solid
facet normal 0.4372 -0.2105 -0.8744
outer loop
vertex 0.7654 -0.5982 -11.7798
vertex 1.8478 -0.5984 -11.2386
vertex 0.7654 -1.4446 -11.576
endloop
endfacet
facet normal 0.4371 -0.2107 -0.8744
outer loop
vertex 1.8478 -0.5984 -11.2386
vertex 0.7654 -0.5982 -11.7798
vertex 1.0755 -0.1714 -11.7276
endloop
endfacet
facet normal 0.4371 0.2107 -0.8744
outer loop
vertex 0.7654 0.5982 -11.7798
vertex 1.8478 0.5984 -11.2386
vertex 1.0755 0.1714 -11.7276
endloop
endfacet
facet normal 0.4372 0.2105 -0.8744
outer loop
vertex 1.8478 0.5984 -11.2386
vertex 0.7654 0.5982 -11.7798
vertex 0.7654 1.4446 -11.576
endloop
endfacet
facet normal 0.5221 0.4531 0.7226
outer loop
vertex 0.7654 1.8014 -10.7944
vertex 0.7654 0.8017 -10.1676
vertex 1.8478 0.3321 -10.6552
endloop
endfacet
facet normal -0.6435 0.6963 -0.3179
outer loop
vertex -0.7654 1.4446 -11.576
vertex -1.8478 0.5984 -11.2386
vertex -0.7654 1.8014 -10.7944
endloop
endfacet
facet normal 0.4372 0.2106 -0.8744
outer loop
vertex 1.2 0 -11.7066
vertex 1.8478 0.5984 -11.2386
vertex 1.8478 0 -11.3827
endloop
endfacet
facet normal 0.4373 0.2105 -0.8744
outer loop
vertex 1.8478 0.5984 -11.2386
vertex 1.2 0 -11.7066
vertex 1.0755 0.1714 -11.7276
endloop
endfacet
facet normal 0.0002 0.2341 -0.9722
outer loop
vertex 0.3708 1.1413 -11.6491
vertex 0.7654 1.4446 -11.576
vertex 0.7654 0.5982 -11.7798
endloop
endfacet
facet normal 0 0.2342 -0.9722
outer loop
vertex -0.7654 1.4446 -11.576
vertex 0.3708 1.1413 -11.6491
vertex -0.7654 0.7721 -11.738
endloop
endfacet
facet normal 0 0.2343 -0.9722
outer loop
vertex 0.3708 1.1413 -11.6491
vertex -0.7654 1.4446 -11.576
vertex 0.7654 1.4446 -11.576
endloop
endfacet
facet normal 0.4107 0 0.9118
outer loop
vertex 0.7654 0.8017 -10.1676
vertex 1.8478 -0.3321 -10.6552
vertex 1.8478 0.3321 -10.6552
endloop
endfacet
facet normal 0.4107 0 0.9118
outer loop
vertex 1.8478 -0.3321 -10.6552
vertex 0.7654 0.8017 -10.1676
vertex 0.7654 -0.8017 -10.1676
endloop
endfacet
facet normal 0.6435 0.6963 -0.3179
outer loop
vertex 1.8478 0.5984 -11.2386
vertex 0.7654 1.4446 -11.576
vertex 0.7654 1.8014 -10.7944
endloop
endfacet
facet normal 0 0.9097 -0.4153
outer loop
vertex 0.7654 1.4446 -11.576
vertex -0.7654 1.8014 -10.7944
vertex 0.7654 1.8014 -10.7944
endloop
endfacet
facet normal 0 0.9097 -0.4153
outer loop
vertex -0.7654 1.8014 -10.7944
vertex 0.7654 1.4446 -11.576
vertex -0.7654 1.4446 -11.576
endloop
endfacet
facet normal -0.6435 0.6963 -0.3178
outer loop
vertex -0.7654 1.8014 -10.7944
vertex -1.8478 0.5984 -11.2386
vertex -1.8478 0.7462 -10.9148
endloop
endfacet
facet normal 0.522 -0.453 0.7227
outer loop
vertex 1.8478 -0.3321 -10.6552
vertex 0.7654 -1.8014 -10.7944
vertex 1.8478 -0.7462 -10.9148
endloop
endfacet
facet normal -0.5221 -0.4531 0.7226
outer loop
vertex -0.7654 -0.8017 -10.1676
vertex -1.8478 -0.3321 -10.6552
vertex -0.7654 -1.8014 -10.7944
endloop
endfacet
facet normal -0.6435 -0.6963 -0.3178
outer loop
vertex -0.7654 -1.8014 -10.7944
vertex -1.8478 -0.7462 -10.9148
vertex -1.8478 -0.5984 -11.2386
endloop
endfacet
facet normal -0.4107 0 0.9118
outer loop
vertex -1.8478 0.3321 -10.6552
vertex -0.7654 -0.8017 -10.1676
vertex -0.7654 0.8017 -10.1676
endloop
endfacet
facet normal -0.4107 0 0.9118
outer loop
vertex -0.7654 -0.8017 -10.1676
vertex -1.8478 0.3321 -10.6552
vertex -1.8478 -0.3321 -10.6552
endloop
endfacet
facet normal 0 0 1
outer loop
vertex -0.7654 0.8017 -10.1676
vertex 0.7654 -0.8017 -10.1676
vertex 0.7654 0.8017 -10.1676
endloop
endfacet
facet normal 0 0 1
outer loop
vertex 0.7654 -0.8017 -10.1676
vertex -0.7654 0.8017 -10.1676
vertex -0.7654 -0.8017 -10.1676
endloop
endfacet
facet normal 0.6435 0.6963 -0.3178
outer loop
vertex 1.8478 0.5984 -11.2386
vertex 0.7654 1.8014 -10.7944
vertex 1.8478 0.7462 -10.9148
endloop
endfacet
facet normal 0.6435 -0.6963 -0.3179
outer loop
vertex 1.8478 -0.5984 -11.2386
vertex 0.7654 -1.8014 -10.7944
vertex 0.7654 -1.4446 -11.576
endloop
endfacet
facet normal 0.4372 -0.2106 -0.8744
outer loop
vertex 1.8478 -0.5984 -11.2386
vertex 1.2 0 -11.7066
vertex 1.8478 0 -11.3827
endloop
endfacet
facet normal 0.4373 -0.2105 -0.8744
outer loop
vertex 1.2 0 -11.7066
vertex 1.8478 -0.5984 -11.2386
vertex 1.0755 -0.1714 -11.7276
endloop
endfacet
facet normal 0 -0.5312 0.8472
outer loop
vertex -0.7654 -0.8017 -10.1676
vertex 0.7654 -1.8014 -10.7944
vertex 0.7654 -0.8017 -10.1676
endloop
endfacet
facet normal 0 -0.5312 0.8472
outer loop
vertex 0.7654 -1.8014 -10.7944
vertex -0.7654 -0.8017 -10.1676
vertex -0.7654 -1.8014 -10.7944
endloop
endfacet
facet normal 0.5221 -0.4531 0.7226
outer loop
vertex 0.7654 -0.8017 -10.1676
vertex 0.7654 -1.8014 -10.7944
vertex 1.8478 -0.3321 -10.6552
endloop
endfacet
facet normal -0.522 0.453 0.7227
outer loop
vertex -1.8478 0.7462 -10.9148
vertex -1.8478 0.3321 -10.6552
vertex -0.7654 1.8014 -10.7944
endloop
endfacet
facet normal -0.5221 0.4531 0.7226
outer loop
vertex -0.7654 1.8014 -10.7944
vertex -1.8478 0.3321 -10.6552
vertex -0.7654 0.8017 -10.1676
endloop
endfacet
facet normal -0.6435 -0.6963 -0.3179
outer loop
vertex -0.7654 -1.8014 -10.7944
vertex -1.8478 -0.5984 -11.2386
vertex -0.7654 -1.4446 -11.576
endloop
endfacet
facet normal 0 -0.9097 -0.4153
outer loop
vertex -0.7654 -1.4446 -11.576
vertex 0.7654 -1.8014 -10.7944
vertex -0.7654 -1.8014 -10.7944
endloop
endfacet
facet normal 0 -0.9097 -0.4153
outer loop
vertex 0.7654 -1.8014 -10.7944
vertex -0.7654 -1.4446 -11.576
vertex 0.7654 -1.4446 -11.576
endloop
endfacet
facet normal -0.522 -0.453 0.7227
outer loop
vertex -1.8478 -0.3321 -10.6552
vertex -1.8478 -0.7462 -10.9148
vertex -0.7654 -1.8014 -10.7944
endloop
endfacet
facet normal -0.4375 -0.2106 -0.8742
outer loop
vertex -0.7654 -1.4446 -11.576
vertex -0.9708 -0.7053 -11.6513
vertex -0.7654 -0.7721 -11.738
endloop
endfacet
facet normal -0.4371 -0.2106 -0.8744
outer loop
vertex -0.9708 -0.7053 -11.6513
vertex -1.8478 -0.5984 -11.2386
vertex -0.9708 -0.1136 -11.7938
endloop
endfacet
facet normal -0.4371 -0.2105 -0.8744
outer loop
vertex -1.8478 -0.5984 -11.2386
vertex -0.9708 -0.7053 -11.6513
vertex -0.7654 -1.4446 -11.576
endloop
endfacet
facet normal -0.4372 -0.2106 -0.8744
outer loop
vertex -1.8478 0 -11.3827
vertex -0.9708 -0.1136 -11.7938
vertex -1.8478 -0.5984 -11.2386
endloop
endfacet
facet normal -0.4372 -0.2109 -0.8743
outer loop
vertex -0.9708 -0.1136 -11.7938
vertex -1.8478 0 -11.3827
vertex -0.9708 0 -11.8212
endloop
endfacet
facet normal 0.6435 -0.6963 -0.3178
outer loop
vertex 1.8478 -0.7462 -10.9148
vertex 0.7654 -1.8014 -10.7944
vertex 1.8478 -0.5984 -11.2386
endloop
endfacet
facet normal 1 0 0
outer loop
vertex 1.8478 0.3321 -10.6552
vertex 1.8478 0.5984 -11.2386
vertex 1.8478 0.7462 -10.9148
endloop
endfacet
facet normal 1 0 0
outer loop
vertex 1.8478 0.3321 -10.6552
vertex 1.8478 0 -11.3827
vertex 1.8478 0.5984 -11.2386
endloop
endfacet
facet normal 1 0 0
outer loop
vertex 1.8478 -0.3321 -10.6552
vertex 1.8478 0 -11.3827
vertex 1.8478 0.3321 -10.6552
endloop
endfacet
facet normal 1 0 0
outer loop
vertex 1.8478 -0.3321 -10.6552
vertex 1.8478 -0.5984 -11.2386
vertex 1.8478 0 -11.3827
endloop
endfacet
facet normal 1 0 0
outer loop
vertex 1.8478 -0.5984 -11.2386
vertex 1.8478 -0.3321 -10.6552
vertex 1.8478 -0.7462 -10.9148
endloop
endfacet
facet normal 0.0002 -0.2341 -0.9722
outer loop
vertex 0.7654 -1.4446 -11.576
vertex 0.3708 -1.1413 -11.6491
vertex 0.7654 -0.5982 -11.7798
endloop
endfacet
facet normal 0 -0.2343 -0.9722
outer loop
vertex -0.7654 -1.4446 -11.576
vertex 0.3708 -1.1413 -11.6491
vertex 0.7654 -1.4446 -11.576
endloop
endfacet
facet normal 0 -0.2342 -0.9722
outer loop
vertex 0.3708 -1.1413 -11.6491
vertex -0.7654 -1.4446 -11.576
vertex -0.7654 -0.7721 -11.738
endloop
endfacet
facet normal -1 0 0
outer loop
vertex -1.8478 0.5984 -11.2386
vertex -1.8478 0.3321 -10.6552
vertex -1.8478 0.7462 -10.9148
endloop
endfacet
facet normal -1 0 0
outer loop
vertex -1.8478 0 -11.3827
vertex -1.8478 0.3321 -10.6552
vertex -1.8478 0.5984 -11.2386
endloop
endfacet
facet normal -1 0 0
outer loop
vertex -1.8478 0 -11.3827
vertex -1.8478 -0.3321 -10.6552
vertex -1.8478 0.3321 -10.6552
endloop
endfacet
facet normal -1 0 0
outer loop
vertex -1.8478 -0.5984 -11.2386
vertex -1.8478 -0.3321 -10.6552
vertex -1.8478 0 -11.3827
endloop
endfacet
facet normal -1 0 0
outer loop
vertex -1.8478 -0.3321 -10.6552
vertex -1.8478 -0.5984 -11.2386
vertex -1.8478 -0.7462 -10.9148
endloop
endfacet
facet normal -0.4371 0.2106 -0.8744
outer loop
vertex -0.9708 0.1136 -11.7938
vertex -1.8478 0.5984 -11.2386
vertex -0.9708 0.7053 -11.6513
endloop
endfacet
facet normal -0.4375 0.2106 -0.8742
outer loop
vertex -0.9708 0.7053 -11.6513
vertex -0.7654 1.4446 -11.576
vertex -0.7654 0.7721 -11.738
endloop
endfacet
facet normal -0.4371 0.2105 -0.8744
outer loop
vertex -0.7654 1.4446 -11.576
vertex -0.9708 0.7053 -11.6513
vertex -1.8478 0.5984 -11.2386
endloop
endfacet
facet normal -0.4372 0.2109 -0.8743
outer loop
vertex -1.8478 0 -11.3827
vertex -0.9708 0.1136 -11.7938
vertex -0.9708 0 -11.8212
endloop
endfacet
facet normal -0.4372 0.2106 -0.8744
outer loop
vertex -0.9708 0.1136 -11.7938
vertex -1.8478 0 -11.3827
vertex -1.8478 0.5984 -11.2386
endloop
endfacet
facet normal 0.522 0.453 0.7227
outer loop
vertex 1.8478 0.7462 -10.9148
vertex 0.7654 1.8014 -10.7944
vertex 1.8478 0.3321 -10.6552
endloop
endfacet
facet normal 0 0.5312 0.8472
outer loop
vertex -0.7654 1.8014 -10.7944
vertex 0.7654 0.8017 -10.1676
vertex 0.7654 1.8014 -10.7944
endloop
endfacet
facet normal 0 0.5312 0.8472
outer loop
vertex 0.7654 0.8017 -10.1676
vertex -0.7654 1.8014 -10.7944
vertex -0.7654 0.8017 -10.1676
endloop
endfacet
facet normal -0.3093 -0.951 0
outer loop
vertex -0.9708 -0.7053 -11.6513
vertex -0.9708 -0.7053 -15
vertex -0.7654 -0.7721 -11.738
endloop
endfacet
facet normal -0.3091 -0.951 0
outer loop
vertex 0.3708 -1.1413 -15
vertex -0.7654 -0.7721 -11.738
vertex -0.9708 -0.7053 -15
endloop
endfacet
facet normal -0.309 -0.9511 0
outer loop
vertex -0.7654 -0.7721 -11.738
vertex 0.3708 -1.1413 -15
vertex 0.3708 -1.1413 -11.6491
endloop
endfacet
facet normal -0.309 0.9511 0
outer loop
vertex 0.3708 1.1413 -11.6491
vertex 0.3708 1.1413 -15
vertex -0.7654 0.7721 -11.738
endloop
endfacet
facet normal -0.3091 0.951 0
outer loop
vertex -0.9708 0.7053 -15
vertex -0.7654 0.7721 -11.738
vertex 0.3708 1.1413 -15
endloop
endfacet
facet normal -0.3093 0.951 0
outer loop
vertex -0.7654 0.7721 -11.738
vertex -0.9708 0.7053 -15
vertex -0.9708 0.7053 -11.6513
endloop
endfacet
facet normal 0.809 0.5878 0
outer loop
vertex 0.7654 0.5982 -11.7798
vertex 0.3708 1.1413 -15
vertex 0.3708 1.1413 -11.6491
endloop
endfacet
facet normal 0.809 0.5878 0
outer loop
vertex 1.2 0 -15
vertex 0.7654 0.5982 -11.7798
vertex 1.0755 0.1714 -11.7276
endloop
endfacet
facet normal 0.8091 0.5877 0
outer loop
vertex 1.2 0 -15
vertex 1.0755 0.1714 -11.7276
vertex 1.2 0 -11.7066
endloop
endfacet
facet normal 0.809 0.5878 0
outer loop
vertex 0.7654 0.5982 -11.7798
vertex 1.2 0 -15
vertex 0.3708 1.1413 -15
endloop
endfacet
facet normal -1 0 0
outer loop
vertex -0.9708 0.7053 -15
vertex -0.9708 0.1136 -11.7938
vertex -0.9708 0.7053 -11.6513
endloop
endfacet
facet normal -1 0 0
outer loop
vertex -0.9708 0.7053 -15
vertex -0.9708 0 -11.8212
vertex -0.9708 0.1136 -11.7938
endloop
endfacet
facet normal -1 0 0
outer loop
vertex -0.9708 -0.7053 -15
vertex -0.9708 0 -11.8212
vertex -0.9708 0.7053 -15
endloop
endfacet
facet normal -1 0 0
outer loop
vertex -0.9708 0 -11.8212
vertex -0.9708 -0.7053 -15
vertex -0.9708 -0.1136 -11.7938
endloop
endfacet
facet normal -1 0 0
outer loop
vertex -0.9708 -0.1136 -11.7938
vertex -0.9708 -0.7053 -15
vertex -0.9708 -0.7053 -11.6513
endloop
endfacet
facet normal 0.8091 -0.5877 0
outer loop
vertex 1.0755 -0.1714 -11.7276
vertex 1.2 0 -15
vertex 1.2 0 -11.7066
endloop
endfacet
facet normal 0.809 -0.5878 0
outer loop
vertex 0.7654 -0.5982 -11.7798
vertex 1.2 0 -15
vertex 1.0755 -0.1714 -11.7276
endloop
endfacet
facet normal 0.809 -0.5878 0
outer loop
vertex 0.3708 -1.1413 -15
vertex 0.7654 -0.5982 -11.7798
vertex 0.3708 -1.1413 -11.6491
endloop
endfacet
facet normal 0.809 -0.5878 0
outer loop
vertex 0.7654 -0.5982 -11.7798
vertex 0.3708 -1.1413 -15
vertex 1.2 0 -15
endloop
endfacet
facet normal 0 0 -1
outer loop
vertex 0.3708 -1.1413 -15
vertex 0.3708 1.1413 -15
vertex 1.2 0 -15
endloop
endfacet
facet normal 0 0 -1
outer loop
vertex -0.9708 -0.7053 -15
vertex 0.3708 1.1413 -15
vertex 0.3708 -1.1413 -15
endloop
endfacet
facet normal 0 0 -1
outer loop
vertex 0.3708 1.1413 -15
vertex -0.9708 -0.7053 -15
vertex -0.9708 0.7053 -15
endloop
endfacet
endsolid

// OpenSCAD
// A non-uniformly scaled sphere fused to a cylinder. The ellipsoid's face
// wrapped all the way around its own seam, and the STEP file written from
// it read back with the ellipsoid empty. Faces are split at the seam
// before writing, so built and roundtrip below must both hold it.
union() {
  translate([0, 0, -11]) rotate([0, 90, 0]) scale([0.5, 1, 1]) sphere(r = 2);
  translate([0, 0, -15]) cylinder(h = 4, r = 1.2);
}
